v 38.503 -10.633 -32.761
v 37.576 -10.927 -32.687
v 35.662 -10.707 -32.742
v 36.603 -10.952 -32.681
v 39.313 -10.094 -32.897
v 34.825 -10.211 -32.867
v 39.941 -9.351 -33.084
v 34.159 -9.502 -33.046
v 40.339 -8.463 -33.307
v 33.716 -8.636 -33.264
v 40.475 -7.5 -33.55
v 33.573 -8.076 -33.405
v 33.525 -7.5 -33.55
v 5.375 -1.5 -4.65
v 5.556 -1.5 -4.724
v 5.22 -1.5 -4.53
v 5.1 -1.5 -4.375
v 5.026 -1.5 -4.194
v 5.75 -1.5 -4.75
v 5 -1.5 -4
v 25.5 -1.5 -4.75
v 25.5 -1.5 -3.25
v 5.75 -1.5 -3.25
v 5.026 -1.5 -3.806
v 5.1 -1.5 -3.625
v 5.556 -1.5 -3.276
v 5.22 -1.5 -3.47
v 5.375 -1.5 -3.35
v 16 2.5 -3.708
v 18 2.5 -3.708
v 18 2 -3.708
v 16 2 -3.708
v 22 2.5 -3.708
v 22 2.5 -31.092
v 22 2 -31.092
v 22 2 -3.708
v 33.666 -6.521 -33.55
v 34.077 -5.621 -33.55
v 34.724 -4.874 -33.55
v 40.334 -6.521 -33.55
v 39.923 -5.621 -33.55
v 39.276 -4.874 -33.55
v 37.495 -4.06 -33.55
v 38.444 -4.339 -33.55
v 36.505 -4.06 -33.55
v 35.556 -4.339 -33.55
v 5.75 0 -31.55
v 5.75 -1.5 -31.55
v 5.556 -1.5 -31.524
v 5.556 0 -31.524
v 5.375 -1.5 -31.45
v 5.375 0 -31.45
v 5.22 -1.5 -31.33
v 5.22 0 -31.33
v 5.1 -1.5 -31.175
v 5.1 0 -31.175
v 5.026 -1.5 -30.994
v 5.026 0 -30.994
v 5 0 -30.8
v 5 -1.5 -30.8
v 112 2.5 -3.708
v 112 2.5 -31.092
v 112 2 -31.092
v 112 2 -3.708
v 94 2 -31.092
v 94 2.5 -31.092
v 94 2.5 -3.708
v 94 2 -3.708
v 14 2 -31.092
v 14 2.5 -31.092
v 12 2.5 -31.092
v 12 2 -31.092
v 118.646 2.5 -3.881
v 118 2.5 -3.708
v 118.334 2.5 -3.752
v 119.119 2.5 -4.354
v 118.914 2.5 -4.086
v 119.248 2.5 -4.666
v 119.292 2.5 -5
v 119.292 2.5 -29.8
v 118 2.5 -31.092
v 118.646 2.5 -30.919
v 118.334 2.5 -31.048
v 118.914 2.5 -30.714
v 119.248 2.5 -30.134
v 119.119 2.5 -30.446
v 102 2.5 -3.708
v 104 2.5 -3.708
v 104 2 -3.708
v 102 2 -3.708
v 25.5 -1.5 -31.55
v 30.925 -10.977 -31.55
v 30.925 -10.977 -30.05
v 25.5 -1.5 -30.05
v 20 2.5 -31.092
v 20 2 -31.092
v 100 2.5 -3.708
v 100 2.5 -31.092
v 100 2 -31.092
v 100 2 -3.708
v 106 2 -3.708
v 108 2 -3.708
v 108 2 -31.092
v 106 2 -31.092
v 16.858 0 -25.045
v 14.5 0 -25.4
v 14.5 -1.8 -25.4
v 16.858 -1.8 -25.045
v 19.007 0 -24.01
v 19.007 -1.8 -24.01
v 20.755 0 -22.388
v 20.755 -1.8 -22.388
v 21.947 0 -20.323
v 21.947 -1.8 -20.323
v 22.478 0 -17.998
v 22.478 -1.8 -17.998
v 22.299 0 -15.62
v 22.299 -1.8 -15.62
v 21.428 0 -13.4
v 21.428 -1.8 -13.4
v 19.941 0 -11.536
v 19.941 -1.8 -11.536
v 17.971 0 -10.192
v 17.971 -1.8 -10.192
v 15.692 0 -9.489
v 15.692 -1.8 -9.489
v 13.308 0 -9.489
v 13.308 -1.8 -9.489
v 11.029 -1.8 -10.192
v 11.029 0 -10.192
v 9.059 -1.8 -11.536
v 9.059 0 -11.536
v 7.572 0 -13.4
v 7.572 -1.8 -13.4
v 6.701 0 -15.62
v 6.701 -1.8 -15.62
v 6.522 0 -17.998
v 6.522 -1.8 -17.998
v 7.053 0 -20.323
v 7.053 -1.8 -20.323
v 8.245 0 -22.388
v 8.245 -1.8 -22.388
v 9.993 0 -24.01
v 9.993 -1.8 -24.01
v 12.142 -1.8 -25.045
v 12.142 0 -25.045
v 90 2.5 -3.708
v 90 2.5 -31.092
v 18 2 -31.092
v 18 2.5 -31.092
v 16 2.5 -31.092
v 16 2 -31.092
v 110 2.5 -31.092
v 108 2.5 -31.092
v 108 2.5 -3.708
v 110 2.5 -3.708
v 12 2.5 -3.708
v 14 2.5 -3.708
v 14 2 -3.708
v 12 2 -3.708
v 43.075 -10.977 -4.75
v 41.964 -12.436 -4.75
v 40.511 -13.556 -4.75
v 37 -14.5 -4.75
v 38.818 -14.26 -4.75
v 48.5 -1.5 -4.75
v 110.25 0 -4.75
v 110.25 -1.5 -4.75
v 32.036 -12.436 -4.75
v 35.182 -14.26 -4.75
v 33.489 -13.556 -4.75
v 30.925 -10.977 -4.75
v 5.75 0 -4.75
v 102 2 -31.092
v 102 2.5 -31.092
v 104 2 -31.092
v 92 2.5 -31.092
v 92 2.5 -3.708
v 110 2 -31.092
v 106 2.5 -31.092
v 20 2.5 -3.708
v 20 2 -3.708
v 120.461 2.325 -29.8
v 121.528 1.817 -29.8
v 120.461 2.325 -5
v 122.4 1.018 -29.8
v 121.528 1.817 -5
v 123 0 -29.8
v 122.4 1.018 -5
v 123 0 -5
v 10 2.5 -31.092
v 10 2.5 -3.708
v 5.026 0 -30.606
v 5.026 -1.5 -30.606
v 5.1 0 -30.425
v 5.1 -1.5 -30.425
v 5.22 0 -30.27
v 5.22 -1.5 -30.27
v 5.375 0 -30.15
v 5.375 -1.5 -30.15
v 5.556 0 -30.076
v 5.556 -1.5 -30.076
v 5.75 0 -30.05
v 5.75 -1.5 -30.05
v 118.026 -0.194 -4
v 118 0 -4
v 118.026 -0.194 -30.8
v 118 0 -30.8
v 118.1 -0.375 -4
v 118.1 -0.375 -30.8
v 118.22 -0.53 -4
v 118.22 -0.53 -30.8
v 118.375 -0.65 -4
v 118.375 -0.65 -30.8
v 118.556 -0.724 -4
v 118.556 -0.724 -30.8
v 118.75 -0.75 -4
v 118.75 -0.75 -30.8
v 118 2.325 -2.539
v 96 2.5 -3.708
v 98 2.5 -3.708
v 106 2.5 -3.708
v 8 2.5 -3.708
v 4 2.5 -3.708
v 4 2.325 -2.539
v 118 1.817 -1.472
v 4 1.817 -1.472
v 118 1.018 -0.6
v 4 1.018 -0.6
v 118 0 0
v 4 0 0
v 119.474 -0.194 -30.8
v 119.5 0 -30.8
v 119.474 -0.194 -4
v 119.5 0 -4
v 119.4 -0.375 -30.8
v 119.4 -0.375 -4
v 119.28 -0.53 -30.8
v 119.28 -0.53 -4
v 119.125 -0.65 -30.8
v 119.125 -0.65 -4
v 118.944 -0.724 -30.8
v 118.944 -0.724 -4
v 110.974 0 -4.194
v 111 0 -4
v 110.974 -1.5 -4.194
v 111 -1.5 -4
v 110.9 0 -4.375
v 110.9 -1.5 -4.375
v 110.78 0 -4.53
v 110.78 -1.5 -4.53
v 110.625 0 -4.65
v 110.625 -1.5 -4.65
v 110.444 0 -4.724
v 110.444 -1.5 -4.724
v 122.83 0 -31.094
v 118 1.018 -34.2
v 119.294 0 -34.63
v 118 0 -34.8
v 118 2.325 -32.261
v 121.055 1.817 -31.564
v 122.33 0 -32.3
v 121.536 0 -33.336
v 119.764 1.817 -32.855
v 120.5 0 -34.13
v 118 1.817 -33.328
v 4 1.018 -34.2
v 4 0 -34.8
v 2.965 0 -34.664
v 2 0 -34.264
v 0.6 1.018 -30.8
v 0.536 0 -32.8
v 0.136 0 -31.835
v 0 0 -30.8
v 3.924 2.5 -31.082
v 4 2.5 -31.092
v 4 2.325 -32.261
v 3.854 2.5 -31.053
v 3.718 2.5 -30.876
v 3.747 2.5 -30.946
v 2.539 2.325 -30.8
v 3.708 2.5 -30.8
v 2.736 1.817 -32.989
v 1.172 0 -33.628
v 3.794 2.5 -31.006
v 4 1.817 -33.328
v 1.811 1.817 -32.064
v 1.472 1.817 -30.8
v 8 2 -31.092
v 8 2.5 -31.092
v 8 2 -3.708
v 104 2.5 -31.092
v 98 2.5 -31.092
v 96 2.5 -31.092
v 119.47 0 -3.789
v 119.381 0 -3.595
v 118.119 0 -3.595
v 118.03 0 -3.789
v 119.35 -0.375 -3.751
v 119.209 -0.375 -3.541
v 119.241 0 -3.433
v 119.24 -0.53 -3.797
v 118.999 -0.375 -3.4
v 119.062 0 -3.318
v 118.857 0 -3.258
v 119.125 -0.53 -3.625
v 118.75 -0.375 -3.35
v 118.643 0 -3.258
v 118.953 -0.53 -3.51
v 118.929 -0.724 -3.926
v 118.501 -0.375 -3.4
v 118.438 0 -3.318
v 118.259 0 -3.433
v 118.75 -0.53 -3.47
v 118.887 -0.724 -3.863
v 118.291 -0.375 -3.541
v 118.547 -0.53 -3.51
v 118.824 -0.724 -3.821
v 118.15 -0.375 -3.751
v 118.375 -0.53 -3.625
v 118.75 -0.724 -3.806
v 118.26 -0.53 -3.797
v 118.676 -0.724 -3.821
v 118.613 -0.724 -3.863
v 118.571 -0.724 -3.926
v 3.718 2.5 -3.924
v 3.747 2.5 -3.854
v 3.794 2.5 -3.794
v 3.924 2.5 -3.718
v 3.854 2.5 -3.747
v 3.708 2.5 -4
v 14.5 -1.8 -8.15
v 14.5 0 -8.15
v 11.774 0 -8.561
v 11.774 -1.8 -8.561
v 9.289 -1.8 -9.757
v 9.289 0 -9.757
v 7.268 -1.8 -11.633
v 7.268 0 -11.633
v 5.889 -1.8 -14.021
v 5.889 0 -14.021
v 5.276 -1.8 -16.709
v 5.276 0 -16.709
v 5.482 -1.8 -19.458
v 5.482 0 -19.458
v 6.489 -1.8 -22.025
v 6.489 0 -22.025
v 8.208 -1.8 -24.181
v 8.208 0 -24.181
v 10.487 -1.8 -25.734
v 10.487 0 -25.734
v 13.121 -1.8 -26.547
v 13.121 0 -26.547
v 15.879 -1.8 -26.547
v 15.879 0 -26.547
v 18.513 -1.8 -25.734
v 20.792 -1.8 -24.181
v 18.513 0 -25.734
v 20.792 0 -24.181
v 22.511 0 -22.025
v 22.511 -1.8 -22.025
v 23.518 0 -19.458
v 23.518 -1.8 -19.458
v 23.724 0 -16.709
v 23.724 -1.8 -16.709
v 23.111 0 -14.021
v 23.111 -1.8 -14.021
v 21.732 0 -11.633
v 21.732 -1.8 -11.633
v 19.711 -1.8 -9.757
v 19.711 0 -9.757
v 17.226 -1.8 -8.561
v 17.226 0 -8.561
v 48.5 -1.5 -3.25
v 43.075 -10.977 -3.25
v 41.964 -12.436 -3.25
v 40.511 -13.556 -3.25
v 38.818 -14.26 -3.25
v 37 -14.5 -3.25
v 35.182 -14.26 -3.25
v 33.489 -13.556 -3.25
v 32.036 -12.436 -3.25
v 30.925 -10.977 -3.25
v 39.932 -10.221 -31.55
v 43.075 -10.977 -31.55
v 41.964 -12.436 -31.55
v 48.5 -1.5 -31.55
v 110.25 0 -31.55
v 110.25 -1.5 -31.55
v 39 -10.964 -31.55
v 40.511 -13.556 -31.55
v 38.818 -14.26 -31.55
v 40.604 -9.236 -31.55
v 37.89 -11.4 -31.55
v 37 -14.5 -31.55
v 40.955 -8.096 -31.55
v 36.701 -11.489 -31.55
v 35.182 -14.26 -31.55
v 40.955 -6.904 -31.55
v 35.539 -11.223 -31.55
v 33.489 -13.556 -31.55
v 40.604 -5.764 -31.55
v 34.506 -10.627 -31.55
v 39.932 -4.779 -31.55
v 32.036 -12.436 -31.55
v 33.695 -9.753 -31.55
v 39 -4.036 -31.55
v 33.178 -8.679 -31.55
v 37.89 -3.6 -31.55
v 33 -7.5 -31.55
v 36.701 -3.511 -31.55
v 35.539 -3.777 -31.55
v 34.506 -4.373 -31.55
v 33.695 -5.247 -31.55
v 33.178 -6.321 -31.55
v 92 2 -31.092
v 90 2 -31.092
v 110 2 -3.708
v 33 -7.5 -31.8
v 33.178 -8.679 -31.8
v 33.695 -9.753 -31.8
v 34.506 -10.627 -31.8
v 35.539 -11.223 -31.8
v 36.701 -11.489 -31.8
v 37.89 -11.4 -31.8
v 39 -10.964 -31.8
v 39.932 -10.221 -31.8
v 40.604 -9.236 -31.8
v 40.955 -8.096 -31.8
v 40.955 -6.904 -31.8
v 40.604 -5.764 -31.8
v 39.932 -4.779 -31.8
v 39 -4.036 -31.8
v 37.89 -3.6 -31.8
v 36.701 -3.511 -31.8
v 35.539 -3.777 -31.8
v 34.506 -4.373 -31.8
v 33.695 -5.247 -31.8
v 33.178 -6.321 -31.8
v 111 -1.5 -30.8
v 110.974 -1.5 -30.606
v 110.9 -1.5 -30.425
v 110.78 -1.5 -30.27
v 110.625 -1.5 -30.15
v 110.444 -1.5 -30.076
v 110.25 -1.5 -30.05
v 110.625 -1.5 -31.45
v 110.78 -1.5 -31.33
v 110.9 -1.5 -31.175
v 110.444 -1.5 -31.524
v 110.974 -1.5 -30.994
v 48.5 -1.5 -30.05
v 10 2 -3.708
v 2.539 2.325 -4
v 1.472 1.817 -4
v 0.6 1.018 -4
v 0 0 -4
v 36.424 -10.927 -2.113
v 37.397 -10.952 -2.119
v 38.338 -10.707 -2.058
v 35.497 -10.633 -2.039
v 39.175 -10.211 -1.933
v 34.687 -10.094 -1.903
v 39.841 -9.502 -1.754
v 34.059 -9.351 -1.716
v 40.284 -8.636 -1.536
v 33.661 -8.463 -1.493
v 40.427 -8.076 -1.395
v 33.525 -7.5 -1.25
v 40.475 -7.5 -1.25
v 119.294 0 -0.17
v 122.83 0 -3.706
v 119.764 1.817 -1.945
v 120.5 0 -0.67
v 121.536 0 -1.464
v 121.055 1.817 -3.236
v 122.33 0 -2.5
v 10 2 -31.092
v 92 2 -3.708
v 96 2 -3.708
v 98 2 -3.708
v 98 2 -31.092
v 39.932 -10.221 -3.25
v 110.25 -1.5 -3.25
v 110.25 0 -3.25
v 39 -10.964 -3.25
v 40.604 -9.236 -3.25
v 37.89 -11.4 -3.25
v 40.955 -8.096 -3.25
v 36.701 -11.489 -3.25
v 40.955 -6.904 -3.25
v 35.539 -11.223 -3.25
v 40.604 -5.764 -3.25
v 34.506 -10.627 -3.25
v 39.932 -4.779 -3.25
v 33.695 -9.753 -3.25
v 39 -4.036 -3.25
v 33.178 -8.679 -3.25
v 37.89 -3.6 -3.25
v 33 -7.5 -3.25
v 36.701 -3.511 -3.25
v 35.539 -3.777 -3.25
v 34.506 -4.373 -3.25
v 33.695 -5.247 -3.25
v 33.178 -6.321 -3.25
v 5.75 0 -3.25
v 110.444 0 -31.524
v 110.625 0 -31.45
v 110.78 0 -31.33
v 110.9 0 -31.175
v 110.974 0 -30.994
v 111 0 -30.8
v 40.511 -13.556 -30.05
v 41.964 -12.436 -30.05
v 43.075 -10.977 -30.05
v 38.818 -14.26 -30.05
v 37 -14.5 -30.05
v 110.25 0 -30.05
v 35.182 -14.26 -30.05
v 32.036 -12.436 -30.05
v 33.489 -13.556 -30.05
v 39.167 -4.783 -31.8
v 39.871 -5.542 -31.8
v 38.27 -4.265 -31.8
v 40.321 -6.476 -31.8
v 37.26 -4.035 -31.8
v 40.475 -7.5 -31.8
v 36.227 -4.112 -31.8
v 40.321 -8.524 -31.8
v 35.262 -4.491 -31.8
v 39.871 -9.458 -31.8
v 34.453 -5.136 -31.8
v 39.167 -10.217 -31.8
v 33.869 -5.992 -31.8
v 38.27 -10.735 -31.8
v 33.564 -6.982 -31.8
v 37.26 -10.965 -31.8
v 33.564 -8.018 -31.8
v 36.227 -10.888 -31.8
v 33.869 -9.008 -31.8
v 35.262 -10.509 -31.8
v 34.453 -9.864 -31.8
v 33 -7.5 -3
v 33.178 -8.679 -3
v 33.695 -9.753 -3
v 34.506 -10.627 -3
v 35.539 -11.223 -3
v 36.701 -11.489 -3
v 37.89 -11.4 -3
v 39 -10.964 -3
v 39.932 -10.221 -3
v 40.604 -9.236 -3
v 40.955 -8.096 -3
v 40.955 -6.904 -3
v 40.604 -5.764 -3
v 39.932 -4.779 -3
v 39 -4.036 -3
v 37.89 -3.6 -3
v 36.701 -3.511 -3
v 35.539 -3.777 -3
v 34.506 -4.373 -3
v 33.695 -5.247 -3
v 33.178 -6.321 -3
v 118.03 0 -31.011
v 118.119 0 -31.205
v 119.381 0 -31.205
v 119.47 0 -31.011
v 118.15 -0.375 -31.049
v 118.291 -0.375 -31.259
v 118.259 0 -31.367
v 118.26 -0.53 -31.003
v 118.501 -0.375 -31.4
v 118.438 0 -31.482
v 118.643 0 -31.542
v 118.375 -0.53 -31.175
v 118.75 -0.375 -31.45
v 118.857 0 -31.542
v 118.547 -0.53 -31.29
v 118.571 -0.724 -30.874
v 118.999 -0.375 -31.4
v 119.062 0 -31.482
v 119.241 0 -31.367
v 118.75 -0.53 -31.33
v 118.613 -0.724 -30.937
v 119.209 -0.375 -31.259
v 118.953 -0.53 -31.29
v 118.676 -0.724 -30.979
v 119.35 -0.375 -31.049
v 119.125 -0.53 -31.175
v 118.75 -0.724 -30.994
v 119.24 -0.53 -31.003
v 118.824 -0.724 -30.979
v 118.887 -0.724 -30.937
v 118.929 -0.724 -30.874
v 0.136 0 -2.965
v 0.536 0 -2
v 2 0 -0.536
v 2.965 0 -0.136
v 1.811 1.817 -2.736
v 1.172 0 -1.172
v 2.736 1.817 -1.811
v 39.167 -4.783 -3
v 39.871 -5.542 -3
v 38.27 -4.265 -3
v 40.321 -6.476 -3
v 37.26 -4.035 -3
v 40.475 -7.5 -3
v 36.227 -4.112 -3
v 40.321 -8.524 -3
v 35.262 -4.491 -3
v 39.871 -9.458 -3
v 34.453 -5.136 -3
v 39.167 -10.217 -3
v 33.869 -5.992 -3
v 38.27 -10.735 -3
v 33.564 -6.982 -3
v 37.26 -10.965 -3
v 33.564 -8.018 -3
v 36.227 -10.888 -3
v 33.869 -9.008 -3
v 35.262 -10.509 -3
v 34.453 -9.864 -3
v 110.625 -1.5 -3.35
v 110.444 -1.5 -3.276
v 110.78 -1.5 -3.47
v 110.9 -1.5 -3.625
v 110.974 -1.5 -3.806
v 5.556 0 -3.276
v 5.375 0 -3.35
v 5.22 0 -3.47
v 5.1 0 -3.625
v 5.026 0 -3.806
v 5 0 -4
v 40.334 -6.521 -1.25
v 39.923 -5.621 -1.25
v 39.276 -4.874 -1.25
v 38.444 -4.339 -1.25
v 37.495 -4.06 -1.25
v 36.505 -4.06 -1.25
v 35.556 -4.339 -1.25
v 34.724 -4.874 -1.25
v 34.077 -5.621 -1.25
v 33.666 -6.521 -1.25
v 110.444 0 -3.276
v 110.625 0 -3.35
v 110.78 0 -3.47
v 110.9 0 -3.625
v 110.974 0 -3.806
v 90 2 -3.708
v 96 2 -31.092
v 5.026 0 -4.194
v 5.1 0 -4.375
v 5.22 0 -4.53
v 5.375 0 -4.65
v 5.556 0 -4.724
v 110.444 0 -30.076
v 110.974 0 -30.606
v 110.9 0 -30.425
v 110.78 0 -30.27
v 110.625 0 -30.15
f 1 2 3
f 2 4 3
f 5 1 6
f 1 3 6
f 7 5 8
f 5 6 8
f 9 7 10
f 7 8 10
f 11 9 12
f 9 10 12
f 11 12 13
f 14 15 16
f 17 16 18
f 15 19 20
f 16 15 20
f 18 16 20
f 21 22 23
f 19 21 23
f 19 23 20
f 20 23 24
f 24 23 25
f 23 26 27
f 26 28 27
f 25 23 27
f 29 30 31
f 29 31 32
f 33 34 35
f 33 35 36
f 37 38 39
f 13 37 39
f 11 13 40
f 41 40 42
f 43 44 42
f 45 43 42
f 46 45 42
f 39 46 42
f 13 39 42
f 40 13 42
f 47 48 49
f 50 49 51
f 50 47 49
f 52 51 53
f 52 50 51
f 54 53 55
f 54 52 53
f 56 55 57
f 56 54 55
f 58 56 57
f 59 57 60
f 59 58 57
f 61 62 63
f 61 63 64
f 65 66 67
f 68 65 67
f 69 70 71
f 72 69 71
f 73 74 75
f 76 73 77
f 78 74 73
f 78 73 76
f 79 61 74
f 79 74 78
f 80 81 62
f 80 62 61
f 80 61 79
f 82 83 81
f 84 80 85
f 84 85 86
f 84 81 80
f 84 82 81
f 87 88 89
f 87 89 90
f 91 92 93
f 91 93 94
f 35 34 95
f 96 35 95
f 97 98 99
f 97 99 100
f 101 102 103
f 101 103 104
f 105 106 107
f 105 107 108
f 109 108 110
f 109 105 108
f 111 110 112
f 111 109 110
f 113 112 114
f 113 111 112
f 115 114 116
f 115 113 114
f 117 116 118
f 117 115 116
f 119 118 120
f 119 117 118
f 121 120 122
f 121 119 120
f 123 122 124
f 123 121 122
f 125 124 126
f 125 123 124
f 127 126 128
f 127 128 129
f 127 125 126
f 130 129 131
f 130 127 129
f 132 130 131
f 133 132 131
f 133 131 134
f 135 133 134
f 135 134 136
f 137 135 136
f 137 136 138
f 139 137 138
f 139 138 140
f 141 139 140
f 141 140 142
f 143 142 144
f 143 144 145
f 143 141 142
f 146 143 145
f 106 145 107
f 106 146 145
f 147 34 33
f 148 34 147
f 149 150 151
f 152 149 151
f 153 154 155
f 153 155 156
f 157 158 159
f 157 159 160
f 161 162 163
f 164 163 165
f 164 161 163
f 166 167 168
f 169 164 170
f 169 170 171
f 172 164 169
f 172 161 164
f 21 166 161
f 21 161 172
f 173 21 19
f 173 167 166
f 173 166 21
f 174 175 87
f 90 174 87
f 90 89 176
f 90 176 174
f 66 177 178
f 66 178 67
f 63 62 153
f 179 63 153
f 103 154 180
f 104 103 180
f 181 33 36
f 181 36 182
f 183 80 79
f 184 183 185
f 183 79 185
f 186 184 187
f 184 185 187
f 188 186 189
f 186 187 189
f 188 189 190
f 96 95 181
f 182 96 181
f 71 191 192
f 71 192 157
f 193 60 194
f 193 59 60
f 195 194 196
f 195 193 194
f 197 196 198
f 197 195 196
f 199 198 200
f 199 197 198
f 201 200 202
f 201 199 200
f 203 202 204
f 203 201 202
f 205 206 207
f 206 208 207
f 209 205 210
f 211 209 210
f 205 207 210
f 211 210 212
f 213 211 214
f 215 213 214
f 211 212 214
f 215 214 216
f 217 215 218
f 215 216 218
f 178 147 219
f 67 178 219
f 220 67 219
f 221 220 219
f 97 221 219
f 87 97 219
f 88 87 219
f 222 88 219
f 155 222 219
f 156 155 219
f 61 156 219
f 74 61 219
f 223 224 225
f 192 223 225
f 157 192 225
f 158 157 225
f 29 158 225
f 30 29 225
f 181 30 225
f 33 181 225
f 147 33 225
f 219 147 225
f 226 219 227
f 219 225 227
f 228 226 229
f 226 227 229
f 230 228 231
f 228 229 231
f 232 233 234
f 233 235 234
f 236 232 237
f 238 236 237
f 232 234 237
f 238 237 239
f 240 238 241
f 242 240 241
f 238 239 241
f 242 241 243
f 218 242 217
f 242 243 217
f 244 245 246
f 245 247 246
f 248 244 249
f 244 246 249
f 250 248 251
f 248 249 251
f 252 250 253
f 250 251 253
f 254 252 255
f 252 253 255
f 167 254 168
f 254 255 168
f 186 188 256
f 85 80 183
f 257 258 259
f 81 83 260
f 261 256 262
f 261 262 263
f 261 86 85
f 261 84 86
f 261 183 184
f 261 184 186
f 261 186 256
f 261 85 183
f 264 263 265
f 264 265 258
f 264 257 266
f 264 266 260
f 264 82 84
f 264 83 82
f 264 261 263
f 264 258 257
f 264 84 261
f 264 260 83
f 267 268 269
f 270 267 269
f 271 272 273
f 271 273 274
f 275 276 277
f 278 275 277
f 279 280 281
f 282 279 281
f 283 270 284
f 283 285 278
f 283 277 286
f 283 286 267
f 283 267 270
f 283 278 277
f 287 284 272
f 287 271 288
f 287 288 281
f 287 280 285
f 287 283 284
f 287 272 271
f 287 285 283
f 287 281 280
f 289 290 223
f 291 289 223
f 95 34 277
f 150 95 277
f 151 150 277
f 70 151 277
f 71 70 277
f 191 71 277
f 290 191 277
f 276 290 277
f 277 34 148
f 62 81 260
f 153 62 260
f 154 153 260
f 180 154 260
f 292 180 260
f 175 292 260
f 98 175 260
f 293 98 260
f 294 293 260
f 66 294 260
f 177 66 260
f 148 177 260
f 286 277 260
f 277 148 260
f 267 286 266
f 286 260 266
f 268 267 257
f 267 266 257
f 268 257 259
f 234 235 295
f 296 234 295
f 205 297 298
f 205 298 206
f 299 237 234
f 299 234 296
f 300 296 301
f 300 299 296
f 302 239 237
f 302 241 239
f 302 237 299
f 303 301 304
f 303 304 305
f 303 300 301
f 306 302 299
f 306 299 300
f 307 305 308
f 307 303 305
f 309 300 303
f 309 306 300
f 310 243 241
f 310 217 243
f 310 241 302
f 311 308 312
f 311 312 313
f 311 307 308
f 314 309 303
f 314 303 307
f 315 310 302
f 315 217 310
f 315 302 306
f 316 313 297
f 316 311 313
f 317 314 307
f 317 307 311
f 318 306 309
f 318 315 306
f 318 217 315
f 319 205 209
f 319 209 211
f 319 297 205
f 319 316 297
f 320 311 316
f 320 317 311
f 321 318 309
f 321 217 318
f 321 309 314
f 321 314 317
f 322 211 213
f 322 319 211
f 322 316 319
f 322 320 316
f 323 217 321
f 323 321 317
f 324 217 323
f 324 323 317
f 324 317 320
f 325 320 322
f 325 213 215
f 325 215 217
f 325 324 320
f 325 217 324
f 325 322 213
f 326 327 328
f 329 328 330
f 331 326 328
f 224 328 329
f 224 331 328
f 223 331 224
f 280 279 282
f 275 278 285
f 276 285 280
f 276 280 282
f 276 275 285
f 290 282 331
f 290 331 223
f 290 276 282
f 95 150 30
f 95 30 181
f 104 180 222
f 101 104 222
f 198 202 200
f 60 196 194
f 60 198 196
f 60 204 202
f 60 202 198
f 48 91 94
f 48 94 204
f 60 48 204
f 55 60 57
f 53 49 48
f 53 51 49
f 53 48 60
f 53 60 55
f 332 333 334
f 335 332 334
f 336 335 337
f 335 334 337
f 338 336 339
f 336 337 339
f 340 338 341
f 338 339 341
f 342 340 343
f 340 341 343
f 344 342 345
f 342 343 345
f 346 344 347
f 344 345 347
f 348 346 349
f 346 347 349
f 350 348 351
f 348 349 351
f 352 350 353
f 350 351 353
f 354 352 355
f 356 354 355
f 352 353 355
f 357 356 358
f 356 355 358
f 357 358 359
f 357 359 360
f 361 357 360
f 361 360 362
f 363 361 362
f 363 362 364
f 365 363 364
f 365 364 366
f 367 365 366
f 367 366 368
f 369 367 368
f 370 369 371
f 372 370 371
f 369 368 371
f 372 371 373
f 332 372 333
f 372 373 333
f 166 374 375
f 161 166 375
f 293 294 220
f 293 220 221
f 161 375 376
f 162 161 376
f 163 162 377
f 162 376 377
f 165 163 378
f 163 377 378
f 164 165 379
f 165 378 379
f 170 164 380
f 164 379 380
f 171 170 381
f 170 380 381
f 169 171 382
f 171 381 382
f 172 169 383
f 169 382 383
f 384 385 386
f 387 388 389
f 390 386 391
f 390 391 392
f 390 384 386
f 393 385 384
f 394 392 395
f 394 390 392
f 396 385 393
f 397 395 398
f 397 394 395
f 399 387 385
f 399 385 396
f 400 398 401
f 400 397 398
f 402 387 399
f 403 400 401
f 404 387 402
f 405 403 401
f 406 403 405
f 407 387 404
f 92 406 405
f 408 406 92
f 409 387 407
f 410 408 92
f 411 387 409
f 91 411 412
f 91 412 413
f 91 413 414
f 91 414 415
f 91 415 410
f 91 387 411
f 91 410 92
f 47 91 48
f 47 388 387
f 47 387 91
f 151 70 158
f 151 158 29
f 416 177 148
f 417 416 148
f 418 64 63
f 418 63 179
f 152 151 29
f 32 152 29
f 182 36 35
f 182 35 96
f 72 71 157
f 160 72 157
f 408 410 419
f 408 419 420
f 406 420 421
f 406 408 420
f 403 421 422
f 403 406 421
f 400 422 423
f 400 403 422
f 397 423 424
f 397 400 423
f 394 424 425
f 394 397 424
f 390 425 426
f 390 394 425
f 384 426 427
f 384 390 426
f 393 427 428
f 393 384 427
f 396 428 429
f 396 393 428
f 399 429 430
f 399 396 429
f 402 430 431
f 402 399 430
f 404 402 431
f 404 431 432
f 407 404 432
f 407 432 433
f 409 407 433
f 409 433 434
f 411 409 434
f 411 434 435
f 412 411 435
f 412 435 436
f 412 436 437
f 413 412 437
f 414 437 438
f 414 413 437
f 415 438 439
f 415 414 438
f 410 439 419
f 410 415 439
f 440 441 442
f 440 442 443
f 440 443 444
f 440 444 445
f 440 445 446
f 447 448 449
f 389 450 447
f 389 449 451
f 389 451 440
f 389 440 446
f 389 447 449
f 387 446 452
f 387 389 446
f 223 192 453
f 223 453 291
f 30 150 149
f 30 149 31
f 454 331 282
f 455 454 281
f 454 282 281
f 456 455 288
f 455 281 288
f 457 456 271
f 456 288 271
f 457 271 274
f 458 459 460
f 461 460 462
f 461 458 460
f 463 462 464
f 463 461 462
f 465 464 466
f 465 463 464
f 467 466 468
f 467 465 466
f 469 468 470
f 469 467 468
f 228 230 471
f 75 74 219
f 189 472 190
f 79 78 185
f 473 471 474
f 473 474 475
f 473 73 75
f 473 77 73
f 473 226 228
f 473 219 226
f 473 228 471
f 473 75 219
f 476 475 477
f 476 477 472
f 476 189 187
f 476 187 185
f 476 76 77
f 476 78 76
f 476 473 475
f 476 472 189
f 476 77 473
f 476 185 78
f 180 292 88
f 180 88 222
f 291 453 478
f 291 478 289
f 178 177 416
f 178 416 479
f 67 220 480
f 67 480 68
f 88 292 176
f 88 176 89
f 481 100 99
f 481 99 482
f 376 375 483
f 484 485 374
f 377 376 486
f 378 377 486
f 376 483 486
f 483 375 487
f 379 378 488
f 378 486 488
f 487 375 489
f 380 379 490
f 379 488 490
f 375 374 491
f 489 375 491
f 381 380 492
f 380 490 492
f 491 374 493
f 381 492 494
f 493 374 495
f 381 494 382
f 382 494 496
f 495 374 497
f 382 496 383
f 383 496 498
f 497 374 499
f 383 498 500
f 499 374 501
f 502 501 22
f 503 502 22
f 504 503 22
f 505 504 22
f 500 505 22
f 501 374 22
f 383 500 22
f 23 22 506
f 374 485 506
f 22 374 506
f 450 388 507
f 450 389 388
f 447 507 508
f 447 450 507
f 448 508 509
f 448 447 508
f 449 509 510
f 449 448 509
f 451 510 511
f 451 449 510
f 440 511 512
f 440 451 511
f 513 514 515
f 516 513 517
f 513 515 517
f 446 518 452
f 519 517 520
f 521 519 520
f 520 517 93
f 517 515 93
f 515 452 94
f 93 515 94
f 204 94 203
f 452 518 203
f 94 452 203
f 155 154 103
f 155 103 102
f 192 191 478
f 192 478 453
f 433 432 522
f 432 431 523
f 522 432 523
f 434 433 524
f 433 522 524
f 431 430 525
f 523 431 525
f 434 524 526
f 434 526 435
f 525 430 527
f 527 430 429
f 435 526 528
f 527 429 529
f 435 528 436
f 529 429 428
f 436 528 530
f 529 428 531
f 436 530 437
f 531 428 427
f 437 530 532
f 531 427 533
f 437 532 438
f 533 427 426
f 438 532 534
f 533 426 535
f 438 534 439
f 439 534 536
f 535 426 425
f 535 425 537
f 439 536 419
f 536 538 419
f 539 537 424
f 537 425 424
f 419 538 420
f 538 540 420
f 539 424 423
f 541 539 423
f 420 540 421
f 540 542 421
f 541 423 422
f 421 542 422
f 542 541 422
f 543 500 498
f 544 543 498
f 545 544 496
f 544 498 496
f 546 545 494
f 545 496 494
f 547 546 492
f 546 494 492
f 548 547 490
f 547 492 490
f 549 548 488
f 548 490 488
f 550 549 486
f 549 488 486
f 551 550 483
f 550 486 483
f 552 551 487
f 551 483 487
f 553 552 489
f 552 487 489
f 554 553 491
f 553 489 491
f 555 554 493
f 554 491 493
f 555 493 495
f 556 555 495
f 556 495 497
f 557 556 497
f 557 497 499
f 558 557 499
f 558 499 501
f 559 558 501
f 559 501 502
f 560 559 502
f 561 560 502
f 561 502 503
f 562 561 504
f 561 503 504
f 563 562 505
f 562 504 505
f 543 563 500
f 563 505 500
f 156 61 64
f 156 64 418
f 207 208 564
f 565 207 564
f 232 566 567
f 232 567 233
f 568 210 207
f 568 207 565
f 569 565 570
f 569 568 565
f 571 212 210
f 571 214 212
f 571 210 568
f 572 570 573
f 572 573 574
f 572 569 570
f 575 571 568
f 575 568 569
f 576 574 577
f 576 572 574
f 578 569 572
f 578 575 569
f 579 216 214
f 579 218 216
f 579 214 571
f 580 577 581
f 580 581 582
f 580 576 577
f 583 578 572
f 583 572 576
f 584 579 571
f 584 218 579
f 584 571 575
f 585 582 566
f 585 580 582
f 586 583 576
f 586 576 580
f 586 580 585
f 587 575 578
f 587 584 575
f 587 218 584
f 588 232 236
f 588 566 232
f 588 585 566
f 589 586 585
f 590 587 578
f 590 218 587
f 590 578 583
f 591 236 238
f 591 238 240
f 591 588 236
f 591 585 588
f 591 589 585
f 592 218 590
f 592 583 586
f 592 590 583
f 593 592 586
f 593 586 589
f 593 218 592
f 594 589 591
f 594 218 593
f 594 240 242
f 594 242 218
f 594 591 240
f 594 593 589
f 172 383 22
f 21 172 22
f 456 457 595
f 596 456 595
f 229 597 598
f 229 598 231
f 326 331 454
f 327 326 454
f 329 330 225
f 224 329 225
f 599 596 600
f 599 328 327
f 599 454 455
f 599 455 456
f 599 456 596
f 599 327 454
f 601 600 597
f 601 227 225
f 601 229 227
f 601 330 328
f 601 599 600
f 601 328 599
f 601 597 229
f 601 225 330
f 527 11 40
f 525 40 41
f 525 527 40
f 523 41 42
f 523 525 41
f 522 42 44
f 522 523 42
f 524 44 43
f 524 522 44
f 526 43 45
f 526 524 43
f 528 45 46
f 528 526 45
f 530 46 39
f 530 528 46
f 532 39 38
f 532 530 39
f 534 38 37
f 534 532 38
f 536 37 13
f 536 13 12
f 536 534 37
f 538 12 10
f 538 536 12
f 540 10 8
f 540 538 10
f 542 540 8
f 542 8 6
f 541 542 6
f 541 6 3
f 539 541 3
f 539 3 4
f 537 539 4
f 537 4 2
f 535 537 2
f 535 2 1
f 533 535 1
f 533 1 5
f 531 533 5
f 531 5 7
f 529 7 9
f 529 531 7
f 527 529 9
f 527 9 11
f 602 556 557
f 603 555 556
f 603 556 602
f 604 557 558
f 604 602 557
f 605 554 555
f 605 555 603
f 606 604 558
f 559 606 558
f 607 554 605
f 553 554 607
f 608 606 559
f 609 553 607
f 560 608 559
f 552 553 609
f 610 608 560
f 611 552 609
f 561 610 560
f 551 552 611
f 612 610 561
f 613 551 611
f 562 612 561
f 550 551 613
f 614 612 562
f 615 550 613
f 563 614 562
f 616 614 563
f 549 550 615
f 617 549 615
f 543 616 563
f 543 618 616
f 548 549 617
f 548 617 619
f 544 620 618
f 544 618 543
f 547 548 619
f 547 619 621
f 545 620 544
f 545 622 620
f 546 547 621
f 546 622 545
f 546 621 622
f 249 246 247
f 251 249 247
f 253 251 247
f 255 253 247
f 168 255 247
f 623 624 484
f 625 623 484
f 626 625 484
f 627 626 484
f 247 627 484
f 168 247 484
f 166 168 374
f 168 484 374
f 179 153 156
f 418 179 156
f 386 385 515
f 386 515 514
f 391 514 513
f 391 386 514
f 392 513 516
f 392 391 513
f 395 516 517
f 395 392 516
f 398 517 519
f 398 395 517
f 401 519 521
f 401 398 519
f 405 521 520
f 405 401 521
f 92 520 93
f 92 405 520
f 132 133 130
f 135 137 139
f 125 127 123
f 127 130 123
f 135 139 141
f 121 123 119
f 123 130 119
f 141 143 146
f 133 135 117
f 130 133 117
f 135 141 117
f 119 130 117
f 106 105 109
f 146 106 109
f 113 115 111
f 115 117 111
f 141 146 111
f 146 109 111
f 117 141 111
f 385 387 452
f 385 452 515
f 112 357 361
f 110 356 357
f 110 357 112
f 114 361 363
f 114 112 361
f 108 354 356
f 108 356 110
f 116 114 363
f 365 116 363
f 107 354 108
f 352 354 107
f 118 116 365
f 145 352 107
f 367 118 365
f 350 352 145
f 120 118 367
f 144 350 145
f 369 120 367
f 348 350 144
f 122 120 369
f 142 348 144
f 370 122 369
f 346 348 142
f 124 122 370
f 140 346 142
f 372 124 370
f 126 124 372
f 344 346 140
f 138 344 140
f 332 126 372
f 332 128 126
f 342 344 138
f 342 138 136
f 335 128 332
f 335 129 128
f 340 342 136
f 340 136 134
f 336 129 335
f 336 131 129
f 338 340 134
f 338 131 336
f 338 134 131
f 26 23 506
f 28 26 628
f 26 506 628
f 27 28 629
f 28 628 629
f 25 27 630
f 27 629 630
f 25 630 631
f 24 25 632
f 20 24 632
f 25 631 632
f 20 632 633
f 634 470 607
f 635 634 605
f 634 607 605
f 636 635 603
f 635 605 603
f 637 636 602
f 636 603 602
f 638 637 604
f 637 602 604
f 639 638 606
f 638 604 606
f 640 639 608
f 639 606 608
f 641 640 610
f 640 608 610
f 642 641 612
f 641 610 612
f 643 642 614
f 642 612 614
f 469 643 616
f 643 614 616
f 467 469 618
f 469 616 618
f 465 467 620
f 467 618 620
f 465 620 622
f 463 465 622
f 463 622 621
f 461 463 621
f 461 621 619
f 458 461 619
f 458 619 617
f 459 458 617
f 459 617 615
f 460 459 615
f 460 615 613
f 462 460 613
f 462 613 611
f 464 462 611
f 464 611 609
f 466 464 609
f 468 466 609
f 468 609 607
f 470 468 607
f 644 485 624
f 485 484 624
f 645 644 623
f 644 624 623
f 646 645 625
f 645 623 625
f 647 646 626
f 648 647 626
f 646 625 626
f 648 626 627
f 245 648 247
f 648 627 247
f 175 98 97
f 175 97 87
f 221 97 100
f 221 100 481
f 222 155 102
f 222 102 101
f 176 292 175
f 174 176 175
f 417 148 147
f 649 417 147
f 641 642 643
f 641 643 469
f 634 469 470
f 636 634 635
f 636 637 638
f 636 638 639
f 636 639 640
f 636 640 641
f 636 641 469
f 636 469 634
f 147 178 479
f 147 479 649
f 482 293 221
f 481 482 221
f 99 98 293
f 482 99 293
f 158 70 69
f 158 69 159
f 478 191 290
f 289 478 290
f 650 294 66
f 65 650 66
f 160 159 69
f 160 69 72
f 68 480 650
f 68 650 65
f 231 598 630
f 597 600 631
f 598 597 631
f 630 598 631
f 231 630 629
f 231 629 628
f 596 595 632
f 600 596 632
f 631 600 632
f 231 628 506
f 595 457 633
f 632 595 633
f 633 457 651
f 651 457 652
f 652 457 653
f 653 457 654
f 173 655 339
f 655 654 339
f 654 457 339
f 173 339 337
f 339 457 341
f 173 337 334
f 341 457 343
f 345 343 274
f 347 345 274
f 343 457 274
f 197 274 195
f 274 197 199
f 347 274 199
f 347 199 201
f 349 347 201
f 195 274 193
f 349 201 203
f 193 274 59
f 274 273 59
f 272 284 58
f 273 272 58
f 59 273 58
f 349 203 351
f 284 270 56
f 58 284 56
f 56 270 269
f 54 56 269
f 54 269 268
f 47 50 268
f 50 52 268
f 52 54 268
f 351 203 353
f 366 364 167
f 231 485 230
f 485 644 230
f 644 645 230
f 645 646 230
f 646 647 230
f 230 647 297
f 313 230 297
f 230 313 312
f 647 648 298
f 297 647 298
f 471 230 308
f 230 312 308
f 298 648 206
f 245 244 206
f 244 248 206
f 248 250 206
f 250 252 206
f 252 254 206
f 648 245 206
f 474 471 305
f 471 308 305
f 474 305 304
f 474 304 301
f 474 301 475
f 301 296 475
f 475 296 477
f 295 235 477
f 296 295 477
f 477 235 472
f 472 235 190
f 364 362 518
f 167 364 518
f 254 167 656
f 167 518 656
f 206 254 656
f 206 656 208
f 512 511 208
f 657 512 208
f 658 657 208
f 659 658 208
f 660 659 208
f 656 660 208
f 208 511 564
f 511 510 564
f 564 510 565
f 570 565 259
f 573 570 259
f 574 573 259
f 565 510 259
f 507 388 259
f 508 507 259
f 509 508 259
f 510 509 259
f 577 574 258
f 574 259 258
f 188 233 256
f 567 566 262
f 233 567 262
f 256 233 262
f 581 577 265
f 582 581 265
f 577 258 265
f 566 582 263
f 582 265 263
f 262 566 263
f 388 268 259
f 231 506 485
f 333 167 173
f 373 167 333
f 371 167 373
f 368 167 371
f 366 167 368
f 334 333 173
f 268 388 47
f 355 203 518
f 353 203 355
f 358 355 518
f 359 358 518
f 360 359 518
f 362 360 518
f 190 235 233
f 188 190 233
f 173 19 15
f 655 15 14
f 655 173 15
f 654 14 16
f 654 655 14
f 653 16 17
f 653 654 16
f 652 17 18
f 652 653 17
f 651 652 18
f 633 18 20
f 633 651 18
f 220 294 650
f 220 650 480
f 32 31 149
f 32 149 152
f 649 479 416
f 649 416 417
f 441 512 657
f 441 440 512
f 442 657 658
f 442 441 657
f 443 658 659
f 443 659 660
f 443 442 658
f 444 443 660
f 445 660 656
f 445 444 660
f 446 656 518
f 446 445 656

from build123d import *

# Parameters (mm, degrees)
BASE_EXTRUDE_DEPTH   = 2.5
FILLET1_R            = 4
BOSS_EXTRUDE1_DEPTH  = 1.5
FILLET2_R            = 0.75
SKETCH4_R            = 4
BOSS_EXTRUDE2_DEPTH  = 0.25
SKETCH5_R            = 3.475
BOSS_EXTRUDE7_DEPTH  = 2
CUT_EXTRUDE2_DEPTH   = 129.647930415
FILLET2_OF_MIRROR1_R = 0.75
BOSS_EXTRUDE8_DEPTH  = 0.75
FILLET3_R            = 0.75
SKETCH8_R            = 9.25
SKETCH8_R_2          = 8
BOSS_EXTRUDE9_DEPTH  = 1.8
SKETCH9_W            = 2
SKETCH9_H            = 27.383801512
CUT_EXTRUDE3_DEPTH   = 0.5
LPATTERN1_COUNT      = 6
LPATTERN1_PITCH      = 4
SKETCH10_W           = 2
SKETCH10_H           = 27.383801512
CUT_EXTRUDE4_DEPTH   = 0.5
LPATTERN2_COUNT      = 4
LPATTERN2_PITCH      = 4


# Some blends are built 0.0001 mm under size
with BuildPart() as part:
    # Sketch1 → Base-Extrude (new body)
    with BuildSketch(Plane(origin=(0, 0, 0), x_dir=(1, 0, 0), z_dir=(0, 1, 0))):
        with BuildLine():
            Line((4, 0), (118, 0))
            ThreePointArc((118, 0), (121.535533906, 1.464466094), (123, 5))
            Line((123, 5), (123, 29.8))
            ThreePointArc((123, 29.8), (121.535533906, 33.335533906), (118, 34.8))
            Line((118, 34.8), (4, 34.8))
            ThreePointArc((4, 34.8), (1.171572875, 33.628427125), (0, 30.8))
            Line((0, 30.8), (0, 4))
            ThreePointArc((0, 4), (1.171572875, 1.171572875), (4, 0))
        make_face()
    extrude(amount=BASE_EXTRUDE_DEPTH)

    # Fillet1
    # the kernel refuses this fillet: 4 mm, written as the material it takes off along each edge
    with BuildSketch(Plane(origin=(118, 2.5, -5), x_dir=(0, 0, 1), z_dir=(-1, 0, 0))) as fillet1_piece_1:
        with BuildLine():
            CenterArc((1.291900756, -4), FILLET1_R, 22.024312837, 67.975687163)
            Line((1.291900756, 0), (1.291900756, 0.08))
            Line((1.291900756, 0.08), (5, 0.08))
            Line((5, 0.08), (5.08, 0))
            ThreePointArc((5.08, 0), (5.08, -1.25), (5.074161985, -2.47))
            Line((5.074161985, -2.47), (5, -2.5))
        make_face()
    revolve(axis=Axis((118, 2.5, -5), (0, 1, 0)), revolution_arc=90, mode=Mode.SUBTRACT)
    with BuildSketch(Plane(origin=(123, 2.5, -5), x_dir=(0, -1, 0), z_dir=(0, 0, -1))) as fillet1_piece_2:
        with BuildLine():
            CenterArc((4, 3.708099244), FILLET1_R, 180, 67.975687163)
            Line((0, 3.708099244), (-0.08, 3.708099244))
            Line((-0.08, 3.708099244), (-0.08, 0))
            Line((-0.08, 0), (0, -0.08))
            ThreePointArc((0, -0.08), (1.25, -0.08), (2.47, -0.074161985))
            Line((2.47, -0.074161985), (2.5, 0))
        make_face()
    extrude(amount=24.8, mode=Mode.SUBTRACT)
    with BuildSketch(Plane(origin=(118, 2.5, -29.8), x_dir=(1, 0, 0), z_dir=(0, 0, 1))) as fillet1_piece_3:
        with BuildLine():
            CenterArc((1.291900756, -4), FILLET1_R, 22.024312837, 67.975687163)
            Line((1.291900756, 0), (1.291900756, 0.08))
            Line((1.291900756, 0.08), (5, 0.08))
            Line((5, 0.08), (5.08, 0))
            ThreePointArc((5.08, 0), (5.08, -1.25), (5.074161985, -2.47))
            Line((5.074161985, -2.47), (5, -2.5))
        make_face()
    revolve(axis=Axis((118, 2.5, -29.8), (0, 1, 0)), revolution_arc=90, mode=Mode.SUBTRACT)
    with BuildSketch(Plane(origin=(118, 2.5, -34.8), x_dir=(0, -1, 0), z_dir=(-1, 0, 0)), Plane(origin=(4, 2.5, 0), x_dir=(0, -1, 0), z_dir=(1, 0, 0))) as fillet1_piece_4:
        with BuildLine():
            CenterArc((4, 3.708099244), FILLET1_R, 180, 67.975687163)
            Line((0, 3.708099244), (-0.08, 3.708099244))
            Line((-0.08, 3.708099244), (-0.08, 0))
            Line((-0.08, 0), (0, -0.08))
            ThreePointArc((0, -0.08), (1.25, -0.08), (2.47, -0.074161985))
            Line((2.47, -0.074161985), (2.5, 0))
        make_face()
    extrude(amount=114, mode=Mode.SUBTRACT)
    with BuildSketch(Plane(origin=(4, 2.5, -30.8), x_dir=(0, 0, -1), z_dir=(1, 0, 0))) as fillet1_piece_5:
        with BuildLine():
            CenterArc((0.291900756, -4), FILLET1_R, 22.024312837, 67.975687163)
            Line((0.291900756, 0), (0.291900756, 0.08))
            Line((0.291900756, 0.08), (4, 0.08))
            Line((4, 0.08), (4.08, 0))
            ThreePointArc((4.08, 0), (4.08, -1.25), (4.074161985, -2.47))
            Line((4.074161985, -2.47), (4, -2.5))
        make_face()
    revolve(axis=Axis((4, 2.5, -30.8), (0, 1, 0)), revolution_arc=90, mode=Mode.SUBTRACT)
    with BuildSketch(Plane(origin=(0, 2.5, -30.8), x_dir=(0, -1, 0), z_dir=(0, 0, 1))) as fillet1_piece_6:
        with BuildLine():
            CenterArc((4, 3.708099244), FILLET1_R, 180, 67.975687163)
            Line((0, 3.708099244), (-0.08, 3.708099244))
            Line((-0.08, 3.708099244), (-0.08, 0))
            Line((-0.08, 0), (0, -0.08))
            ThreePointArc((0, -0.08), (1.25, -0.08), (2.47, -0.074161985))
            Line((2.47, -0.074161985), (2.5, 0))
        make_face()
    extrude(amount=26.8, mode=Mode.SUBTRACT)
    with BuildSketch(Plane(origin=(4, 2.5, -4), x_dir=(-1, 0, 0), z_dir=(0, 0, -1))) as fillet1_piece_7:
        with BuildLine():
            CenterArc((0.291900756, -4), FILLET1_R, 22.024312837, 67.975687163)
            Line((0.291900756, 0), (0.291900756, 0.08))
            Line((0.291900756, 0.08), (4, 0.08))
            Line((4, 0.08), (4.08, 0))
            ThreePointArc((4.08, 0), (4.08, -1.25), (4.074161985, -2.47))
            Line((4.074161985, -2.47), (4, -2.5))
        make_face()
    revolve(axis=Axis((4, 2.5, -4), (0, 1, 0)), revolution_arc=90, mode=Mode.SUBTRACT)

    # Sketch3 → Boss-Extrude1 (add)
    with BuildSketch(Plane.XY.offset(-3.25)):
        with BuildLine():
            Line((5, 0), (111, 0))
            Line((111, 0), (111, -1.5))
            Line((111, -1.5), (48.5, -1.5))
            Line((48.5, -1.5), (43.075167447, -10.977404274))
            ThreePointArc((43.075167447, -10.977404274), (37, -14.5), (30.924832553, -10.977404274))
            Line((30.924832553, -10.977404274), (25.5, -1.5))
            Line((25.5, -1.5), (5, -1.5))
            Line((5, -1.5), (5, 0))
        make_face()
    boss_extrude1 = extrude(amount=-BOSS_EXTRUDE1_DEPTH)

    # Fillet2
    fillet2_edges = [part.edges().sort_by_distance(p)[0] for p in [
        (5, -0.75, -4.75),
        (111, -0.75, -3.25),
        (111, -0.75, -4.75),
        (5, -0.75, -3.25),
    ]]
    fillet(fillet2_edges, radius=FILLET2_R - 0.0001)  # a hair under: the kernel refuses the full size

    # Sketch4 → Boss-Extrude2 (add)
    with BuildSketch(Plane.XY.offset(-3.25)):
        with Locations(Location((37, -7.5, 0), (0, 0, 180))):
            Circle(SKETCH4_R)
    boss_extrude2 = extrude(amount=BOSS_EXTRUDE2_DEPTH)

    # Sketch5 → Boss-Extrude7 (add)
    with BuildSketch(Plane.XY.offset(-3.25)):
        with Locations((37, -7.5)):
            Circle(SKETCH5_R)
    boss_extrude7 = extrude(amount=BOSS_EXTRUDE7_DEPTH)

    # Sketch6 → Cut-Extrude2 (cut, through all)
    with BuildSketch(Plane(origin=(0, 0, 0), x_dir=(0, 0, -1), z_dir=(1, 0, 0))):
        Polygon((-18.452365233, 70.746536211), (1.25, -7.5), (2.125, -10.975), (21.827365233, -89.221536211), (-134.665707189, -128.626266677), (-174.945437655, 31.341805745), align=None)
    cut_extrude2 = extrude(amount=CUT_EXTRUDE2_DEPTH, mode=Mode.SUBTRACT)

    # Mirror1: Boss-Extrude1, Boss-Extrude2, Boss-Extrude7, Cut-Extrude2 across plane
    add(boss_extrude1.mirror(Plane.XY.offset(-17.4)))
    add(boss_extrude2.mirror(Plane.XY.offset(-17.4)))
    add(boss_extrude7.mirror(Plane.XY.offset(-17.4)))
    add(cut_extrude2.mirror(Plane.XY.offset(-17.4)), mode=Mode.SUBTRACT)

    # Fillet2 of Mirror1
    fillet2_of_mirror1_edges = [part.edges().sort_by_distance(p)[0] for p in [
        (5, -0.75, -30.05),
        (111, -0.75, -31.55),
        (111, -0.75, -30.05),
        (5, -0.75, -31.55),
    ]]
    fillet(fillet2_of_mirror1_edges, radius=FILLET2_OF_MIRROR1_R - 0.0001)  # a hair under: the kernel refuses the full size

    # Sketch7 → Boss-Extrude8 (add)
    with BuildSketch(Plane.XZ):
        with BuildLine():
            Line((119.5, -30.8), (119.5, -4))
            ThreePointArc((119.5, -4), (118.75, -3.25), (118, -4))
            Line((118, -4), (118, -30.8))
            ThreePointArc((118, -30.8), (118.75, -31.55), (119.5, -30.8))
        make_face()
    extrude(amount=BOSS_EXTRUDE8_DEPTH)

    # Fillet3
    fillet3_edges = [part.edges().sort_by_distance(p)[0] for p in [
        (118.75, -0.75, -31.55),
        (118.75, -0.75, -3.25),
        (119.5, -0.75, -17.4),
        (118, -0.75, -17.4),
    ]]
    fillet(fillet3_edges, radius=FILLET3_R - 0.0001)  # a hair under: the kernel refuses the full size

    # Sketch8 → Boss-Extrude9 (add)
    with BuildSketch(Plane.XZ):
        with Locations(Location((14.5, -17.4, 0), (0, 0, 90))):
            Circle(SKETCH8_R)
        with Locations(Location((14.5, -17.4, 0), (0, 0, 270))):
            Circle(SKETCH8_R_2, mode=Mode.SUBTRACT)
    extrude(amount=BOSS_EXTRUDE9_DEPTH)

    # Sketch9 → Cut-Extrude3 (cut)
    with BuildSketch(Plane(origin=(0, 2.5, 0), x_dir=(-1, 0, 0), z_dir=(0, 1, 0))):
        with Locations((-111, -17.4)):
            Rectangle(SKETCH9_W, SKETCH9_H)
    cut_extrude3 = extrude(amount=-CUT_EXTRUDE3_DEPTH, mode=Mode.SUBTRACT)

    # LPattern1: Cut-Extrude3 ×6
    with Locations(*[(-i * LPATTERN1_PITCH, 0, 0) for i in range(1, LPATTERN1_COUNT)]):
        add(cut_extrude3, mode=Mode.SUBTRACT)

    # Sketch10 → Cut-Extrude4 (cut)
    with BuildSketch(Plane(origin=(-102, 2.5, 0), x_dir=(-1, 0, 0), z_dir=(0, 1, 0))):
        with Locations((-111, -17.4)):
            Rectangle(SKETCH10_W, SKETCH10_H)
    cut_extrude4 = extrude(amount=-CUT_EXTRUDE4_DEPTH, mode=Mode.SUBTRACT)

    # LPattern2: Cut-Extrude4 ×4
    with Locations(*[(i * LPATTERN2_PITCH, 0, 0) for i in range(1, LPATTERN2_COUNT)]):
        add(cut_extrude4, mode=Mode.SUBTRACT)


solid = part.part
